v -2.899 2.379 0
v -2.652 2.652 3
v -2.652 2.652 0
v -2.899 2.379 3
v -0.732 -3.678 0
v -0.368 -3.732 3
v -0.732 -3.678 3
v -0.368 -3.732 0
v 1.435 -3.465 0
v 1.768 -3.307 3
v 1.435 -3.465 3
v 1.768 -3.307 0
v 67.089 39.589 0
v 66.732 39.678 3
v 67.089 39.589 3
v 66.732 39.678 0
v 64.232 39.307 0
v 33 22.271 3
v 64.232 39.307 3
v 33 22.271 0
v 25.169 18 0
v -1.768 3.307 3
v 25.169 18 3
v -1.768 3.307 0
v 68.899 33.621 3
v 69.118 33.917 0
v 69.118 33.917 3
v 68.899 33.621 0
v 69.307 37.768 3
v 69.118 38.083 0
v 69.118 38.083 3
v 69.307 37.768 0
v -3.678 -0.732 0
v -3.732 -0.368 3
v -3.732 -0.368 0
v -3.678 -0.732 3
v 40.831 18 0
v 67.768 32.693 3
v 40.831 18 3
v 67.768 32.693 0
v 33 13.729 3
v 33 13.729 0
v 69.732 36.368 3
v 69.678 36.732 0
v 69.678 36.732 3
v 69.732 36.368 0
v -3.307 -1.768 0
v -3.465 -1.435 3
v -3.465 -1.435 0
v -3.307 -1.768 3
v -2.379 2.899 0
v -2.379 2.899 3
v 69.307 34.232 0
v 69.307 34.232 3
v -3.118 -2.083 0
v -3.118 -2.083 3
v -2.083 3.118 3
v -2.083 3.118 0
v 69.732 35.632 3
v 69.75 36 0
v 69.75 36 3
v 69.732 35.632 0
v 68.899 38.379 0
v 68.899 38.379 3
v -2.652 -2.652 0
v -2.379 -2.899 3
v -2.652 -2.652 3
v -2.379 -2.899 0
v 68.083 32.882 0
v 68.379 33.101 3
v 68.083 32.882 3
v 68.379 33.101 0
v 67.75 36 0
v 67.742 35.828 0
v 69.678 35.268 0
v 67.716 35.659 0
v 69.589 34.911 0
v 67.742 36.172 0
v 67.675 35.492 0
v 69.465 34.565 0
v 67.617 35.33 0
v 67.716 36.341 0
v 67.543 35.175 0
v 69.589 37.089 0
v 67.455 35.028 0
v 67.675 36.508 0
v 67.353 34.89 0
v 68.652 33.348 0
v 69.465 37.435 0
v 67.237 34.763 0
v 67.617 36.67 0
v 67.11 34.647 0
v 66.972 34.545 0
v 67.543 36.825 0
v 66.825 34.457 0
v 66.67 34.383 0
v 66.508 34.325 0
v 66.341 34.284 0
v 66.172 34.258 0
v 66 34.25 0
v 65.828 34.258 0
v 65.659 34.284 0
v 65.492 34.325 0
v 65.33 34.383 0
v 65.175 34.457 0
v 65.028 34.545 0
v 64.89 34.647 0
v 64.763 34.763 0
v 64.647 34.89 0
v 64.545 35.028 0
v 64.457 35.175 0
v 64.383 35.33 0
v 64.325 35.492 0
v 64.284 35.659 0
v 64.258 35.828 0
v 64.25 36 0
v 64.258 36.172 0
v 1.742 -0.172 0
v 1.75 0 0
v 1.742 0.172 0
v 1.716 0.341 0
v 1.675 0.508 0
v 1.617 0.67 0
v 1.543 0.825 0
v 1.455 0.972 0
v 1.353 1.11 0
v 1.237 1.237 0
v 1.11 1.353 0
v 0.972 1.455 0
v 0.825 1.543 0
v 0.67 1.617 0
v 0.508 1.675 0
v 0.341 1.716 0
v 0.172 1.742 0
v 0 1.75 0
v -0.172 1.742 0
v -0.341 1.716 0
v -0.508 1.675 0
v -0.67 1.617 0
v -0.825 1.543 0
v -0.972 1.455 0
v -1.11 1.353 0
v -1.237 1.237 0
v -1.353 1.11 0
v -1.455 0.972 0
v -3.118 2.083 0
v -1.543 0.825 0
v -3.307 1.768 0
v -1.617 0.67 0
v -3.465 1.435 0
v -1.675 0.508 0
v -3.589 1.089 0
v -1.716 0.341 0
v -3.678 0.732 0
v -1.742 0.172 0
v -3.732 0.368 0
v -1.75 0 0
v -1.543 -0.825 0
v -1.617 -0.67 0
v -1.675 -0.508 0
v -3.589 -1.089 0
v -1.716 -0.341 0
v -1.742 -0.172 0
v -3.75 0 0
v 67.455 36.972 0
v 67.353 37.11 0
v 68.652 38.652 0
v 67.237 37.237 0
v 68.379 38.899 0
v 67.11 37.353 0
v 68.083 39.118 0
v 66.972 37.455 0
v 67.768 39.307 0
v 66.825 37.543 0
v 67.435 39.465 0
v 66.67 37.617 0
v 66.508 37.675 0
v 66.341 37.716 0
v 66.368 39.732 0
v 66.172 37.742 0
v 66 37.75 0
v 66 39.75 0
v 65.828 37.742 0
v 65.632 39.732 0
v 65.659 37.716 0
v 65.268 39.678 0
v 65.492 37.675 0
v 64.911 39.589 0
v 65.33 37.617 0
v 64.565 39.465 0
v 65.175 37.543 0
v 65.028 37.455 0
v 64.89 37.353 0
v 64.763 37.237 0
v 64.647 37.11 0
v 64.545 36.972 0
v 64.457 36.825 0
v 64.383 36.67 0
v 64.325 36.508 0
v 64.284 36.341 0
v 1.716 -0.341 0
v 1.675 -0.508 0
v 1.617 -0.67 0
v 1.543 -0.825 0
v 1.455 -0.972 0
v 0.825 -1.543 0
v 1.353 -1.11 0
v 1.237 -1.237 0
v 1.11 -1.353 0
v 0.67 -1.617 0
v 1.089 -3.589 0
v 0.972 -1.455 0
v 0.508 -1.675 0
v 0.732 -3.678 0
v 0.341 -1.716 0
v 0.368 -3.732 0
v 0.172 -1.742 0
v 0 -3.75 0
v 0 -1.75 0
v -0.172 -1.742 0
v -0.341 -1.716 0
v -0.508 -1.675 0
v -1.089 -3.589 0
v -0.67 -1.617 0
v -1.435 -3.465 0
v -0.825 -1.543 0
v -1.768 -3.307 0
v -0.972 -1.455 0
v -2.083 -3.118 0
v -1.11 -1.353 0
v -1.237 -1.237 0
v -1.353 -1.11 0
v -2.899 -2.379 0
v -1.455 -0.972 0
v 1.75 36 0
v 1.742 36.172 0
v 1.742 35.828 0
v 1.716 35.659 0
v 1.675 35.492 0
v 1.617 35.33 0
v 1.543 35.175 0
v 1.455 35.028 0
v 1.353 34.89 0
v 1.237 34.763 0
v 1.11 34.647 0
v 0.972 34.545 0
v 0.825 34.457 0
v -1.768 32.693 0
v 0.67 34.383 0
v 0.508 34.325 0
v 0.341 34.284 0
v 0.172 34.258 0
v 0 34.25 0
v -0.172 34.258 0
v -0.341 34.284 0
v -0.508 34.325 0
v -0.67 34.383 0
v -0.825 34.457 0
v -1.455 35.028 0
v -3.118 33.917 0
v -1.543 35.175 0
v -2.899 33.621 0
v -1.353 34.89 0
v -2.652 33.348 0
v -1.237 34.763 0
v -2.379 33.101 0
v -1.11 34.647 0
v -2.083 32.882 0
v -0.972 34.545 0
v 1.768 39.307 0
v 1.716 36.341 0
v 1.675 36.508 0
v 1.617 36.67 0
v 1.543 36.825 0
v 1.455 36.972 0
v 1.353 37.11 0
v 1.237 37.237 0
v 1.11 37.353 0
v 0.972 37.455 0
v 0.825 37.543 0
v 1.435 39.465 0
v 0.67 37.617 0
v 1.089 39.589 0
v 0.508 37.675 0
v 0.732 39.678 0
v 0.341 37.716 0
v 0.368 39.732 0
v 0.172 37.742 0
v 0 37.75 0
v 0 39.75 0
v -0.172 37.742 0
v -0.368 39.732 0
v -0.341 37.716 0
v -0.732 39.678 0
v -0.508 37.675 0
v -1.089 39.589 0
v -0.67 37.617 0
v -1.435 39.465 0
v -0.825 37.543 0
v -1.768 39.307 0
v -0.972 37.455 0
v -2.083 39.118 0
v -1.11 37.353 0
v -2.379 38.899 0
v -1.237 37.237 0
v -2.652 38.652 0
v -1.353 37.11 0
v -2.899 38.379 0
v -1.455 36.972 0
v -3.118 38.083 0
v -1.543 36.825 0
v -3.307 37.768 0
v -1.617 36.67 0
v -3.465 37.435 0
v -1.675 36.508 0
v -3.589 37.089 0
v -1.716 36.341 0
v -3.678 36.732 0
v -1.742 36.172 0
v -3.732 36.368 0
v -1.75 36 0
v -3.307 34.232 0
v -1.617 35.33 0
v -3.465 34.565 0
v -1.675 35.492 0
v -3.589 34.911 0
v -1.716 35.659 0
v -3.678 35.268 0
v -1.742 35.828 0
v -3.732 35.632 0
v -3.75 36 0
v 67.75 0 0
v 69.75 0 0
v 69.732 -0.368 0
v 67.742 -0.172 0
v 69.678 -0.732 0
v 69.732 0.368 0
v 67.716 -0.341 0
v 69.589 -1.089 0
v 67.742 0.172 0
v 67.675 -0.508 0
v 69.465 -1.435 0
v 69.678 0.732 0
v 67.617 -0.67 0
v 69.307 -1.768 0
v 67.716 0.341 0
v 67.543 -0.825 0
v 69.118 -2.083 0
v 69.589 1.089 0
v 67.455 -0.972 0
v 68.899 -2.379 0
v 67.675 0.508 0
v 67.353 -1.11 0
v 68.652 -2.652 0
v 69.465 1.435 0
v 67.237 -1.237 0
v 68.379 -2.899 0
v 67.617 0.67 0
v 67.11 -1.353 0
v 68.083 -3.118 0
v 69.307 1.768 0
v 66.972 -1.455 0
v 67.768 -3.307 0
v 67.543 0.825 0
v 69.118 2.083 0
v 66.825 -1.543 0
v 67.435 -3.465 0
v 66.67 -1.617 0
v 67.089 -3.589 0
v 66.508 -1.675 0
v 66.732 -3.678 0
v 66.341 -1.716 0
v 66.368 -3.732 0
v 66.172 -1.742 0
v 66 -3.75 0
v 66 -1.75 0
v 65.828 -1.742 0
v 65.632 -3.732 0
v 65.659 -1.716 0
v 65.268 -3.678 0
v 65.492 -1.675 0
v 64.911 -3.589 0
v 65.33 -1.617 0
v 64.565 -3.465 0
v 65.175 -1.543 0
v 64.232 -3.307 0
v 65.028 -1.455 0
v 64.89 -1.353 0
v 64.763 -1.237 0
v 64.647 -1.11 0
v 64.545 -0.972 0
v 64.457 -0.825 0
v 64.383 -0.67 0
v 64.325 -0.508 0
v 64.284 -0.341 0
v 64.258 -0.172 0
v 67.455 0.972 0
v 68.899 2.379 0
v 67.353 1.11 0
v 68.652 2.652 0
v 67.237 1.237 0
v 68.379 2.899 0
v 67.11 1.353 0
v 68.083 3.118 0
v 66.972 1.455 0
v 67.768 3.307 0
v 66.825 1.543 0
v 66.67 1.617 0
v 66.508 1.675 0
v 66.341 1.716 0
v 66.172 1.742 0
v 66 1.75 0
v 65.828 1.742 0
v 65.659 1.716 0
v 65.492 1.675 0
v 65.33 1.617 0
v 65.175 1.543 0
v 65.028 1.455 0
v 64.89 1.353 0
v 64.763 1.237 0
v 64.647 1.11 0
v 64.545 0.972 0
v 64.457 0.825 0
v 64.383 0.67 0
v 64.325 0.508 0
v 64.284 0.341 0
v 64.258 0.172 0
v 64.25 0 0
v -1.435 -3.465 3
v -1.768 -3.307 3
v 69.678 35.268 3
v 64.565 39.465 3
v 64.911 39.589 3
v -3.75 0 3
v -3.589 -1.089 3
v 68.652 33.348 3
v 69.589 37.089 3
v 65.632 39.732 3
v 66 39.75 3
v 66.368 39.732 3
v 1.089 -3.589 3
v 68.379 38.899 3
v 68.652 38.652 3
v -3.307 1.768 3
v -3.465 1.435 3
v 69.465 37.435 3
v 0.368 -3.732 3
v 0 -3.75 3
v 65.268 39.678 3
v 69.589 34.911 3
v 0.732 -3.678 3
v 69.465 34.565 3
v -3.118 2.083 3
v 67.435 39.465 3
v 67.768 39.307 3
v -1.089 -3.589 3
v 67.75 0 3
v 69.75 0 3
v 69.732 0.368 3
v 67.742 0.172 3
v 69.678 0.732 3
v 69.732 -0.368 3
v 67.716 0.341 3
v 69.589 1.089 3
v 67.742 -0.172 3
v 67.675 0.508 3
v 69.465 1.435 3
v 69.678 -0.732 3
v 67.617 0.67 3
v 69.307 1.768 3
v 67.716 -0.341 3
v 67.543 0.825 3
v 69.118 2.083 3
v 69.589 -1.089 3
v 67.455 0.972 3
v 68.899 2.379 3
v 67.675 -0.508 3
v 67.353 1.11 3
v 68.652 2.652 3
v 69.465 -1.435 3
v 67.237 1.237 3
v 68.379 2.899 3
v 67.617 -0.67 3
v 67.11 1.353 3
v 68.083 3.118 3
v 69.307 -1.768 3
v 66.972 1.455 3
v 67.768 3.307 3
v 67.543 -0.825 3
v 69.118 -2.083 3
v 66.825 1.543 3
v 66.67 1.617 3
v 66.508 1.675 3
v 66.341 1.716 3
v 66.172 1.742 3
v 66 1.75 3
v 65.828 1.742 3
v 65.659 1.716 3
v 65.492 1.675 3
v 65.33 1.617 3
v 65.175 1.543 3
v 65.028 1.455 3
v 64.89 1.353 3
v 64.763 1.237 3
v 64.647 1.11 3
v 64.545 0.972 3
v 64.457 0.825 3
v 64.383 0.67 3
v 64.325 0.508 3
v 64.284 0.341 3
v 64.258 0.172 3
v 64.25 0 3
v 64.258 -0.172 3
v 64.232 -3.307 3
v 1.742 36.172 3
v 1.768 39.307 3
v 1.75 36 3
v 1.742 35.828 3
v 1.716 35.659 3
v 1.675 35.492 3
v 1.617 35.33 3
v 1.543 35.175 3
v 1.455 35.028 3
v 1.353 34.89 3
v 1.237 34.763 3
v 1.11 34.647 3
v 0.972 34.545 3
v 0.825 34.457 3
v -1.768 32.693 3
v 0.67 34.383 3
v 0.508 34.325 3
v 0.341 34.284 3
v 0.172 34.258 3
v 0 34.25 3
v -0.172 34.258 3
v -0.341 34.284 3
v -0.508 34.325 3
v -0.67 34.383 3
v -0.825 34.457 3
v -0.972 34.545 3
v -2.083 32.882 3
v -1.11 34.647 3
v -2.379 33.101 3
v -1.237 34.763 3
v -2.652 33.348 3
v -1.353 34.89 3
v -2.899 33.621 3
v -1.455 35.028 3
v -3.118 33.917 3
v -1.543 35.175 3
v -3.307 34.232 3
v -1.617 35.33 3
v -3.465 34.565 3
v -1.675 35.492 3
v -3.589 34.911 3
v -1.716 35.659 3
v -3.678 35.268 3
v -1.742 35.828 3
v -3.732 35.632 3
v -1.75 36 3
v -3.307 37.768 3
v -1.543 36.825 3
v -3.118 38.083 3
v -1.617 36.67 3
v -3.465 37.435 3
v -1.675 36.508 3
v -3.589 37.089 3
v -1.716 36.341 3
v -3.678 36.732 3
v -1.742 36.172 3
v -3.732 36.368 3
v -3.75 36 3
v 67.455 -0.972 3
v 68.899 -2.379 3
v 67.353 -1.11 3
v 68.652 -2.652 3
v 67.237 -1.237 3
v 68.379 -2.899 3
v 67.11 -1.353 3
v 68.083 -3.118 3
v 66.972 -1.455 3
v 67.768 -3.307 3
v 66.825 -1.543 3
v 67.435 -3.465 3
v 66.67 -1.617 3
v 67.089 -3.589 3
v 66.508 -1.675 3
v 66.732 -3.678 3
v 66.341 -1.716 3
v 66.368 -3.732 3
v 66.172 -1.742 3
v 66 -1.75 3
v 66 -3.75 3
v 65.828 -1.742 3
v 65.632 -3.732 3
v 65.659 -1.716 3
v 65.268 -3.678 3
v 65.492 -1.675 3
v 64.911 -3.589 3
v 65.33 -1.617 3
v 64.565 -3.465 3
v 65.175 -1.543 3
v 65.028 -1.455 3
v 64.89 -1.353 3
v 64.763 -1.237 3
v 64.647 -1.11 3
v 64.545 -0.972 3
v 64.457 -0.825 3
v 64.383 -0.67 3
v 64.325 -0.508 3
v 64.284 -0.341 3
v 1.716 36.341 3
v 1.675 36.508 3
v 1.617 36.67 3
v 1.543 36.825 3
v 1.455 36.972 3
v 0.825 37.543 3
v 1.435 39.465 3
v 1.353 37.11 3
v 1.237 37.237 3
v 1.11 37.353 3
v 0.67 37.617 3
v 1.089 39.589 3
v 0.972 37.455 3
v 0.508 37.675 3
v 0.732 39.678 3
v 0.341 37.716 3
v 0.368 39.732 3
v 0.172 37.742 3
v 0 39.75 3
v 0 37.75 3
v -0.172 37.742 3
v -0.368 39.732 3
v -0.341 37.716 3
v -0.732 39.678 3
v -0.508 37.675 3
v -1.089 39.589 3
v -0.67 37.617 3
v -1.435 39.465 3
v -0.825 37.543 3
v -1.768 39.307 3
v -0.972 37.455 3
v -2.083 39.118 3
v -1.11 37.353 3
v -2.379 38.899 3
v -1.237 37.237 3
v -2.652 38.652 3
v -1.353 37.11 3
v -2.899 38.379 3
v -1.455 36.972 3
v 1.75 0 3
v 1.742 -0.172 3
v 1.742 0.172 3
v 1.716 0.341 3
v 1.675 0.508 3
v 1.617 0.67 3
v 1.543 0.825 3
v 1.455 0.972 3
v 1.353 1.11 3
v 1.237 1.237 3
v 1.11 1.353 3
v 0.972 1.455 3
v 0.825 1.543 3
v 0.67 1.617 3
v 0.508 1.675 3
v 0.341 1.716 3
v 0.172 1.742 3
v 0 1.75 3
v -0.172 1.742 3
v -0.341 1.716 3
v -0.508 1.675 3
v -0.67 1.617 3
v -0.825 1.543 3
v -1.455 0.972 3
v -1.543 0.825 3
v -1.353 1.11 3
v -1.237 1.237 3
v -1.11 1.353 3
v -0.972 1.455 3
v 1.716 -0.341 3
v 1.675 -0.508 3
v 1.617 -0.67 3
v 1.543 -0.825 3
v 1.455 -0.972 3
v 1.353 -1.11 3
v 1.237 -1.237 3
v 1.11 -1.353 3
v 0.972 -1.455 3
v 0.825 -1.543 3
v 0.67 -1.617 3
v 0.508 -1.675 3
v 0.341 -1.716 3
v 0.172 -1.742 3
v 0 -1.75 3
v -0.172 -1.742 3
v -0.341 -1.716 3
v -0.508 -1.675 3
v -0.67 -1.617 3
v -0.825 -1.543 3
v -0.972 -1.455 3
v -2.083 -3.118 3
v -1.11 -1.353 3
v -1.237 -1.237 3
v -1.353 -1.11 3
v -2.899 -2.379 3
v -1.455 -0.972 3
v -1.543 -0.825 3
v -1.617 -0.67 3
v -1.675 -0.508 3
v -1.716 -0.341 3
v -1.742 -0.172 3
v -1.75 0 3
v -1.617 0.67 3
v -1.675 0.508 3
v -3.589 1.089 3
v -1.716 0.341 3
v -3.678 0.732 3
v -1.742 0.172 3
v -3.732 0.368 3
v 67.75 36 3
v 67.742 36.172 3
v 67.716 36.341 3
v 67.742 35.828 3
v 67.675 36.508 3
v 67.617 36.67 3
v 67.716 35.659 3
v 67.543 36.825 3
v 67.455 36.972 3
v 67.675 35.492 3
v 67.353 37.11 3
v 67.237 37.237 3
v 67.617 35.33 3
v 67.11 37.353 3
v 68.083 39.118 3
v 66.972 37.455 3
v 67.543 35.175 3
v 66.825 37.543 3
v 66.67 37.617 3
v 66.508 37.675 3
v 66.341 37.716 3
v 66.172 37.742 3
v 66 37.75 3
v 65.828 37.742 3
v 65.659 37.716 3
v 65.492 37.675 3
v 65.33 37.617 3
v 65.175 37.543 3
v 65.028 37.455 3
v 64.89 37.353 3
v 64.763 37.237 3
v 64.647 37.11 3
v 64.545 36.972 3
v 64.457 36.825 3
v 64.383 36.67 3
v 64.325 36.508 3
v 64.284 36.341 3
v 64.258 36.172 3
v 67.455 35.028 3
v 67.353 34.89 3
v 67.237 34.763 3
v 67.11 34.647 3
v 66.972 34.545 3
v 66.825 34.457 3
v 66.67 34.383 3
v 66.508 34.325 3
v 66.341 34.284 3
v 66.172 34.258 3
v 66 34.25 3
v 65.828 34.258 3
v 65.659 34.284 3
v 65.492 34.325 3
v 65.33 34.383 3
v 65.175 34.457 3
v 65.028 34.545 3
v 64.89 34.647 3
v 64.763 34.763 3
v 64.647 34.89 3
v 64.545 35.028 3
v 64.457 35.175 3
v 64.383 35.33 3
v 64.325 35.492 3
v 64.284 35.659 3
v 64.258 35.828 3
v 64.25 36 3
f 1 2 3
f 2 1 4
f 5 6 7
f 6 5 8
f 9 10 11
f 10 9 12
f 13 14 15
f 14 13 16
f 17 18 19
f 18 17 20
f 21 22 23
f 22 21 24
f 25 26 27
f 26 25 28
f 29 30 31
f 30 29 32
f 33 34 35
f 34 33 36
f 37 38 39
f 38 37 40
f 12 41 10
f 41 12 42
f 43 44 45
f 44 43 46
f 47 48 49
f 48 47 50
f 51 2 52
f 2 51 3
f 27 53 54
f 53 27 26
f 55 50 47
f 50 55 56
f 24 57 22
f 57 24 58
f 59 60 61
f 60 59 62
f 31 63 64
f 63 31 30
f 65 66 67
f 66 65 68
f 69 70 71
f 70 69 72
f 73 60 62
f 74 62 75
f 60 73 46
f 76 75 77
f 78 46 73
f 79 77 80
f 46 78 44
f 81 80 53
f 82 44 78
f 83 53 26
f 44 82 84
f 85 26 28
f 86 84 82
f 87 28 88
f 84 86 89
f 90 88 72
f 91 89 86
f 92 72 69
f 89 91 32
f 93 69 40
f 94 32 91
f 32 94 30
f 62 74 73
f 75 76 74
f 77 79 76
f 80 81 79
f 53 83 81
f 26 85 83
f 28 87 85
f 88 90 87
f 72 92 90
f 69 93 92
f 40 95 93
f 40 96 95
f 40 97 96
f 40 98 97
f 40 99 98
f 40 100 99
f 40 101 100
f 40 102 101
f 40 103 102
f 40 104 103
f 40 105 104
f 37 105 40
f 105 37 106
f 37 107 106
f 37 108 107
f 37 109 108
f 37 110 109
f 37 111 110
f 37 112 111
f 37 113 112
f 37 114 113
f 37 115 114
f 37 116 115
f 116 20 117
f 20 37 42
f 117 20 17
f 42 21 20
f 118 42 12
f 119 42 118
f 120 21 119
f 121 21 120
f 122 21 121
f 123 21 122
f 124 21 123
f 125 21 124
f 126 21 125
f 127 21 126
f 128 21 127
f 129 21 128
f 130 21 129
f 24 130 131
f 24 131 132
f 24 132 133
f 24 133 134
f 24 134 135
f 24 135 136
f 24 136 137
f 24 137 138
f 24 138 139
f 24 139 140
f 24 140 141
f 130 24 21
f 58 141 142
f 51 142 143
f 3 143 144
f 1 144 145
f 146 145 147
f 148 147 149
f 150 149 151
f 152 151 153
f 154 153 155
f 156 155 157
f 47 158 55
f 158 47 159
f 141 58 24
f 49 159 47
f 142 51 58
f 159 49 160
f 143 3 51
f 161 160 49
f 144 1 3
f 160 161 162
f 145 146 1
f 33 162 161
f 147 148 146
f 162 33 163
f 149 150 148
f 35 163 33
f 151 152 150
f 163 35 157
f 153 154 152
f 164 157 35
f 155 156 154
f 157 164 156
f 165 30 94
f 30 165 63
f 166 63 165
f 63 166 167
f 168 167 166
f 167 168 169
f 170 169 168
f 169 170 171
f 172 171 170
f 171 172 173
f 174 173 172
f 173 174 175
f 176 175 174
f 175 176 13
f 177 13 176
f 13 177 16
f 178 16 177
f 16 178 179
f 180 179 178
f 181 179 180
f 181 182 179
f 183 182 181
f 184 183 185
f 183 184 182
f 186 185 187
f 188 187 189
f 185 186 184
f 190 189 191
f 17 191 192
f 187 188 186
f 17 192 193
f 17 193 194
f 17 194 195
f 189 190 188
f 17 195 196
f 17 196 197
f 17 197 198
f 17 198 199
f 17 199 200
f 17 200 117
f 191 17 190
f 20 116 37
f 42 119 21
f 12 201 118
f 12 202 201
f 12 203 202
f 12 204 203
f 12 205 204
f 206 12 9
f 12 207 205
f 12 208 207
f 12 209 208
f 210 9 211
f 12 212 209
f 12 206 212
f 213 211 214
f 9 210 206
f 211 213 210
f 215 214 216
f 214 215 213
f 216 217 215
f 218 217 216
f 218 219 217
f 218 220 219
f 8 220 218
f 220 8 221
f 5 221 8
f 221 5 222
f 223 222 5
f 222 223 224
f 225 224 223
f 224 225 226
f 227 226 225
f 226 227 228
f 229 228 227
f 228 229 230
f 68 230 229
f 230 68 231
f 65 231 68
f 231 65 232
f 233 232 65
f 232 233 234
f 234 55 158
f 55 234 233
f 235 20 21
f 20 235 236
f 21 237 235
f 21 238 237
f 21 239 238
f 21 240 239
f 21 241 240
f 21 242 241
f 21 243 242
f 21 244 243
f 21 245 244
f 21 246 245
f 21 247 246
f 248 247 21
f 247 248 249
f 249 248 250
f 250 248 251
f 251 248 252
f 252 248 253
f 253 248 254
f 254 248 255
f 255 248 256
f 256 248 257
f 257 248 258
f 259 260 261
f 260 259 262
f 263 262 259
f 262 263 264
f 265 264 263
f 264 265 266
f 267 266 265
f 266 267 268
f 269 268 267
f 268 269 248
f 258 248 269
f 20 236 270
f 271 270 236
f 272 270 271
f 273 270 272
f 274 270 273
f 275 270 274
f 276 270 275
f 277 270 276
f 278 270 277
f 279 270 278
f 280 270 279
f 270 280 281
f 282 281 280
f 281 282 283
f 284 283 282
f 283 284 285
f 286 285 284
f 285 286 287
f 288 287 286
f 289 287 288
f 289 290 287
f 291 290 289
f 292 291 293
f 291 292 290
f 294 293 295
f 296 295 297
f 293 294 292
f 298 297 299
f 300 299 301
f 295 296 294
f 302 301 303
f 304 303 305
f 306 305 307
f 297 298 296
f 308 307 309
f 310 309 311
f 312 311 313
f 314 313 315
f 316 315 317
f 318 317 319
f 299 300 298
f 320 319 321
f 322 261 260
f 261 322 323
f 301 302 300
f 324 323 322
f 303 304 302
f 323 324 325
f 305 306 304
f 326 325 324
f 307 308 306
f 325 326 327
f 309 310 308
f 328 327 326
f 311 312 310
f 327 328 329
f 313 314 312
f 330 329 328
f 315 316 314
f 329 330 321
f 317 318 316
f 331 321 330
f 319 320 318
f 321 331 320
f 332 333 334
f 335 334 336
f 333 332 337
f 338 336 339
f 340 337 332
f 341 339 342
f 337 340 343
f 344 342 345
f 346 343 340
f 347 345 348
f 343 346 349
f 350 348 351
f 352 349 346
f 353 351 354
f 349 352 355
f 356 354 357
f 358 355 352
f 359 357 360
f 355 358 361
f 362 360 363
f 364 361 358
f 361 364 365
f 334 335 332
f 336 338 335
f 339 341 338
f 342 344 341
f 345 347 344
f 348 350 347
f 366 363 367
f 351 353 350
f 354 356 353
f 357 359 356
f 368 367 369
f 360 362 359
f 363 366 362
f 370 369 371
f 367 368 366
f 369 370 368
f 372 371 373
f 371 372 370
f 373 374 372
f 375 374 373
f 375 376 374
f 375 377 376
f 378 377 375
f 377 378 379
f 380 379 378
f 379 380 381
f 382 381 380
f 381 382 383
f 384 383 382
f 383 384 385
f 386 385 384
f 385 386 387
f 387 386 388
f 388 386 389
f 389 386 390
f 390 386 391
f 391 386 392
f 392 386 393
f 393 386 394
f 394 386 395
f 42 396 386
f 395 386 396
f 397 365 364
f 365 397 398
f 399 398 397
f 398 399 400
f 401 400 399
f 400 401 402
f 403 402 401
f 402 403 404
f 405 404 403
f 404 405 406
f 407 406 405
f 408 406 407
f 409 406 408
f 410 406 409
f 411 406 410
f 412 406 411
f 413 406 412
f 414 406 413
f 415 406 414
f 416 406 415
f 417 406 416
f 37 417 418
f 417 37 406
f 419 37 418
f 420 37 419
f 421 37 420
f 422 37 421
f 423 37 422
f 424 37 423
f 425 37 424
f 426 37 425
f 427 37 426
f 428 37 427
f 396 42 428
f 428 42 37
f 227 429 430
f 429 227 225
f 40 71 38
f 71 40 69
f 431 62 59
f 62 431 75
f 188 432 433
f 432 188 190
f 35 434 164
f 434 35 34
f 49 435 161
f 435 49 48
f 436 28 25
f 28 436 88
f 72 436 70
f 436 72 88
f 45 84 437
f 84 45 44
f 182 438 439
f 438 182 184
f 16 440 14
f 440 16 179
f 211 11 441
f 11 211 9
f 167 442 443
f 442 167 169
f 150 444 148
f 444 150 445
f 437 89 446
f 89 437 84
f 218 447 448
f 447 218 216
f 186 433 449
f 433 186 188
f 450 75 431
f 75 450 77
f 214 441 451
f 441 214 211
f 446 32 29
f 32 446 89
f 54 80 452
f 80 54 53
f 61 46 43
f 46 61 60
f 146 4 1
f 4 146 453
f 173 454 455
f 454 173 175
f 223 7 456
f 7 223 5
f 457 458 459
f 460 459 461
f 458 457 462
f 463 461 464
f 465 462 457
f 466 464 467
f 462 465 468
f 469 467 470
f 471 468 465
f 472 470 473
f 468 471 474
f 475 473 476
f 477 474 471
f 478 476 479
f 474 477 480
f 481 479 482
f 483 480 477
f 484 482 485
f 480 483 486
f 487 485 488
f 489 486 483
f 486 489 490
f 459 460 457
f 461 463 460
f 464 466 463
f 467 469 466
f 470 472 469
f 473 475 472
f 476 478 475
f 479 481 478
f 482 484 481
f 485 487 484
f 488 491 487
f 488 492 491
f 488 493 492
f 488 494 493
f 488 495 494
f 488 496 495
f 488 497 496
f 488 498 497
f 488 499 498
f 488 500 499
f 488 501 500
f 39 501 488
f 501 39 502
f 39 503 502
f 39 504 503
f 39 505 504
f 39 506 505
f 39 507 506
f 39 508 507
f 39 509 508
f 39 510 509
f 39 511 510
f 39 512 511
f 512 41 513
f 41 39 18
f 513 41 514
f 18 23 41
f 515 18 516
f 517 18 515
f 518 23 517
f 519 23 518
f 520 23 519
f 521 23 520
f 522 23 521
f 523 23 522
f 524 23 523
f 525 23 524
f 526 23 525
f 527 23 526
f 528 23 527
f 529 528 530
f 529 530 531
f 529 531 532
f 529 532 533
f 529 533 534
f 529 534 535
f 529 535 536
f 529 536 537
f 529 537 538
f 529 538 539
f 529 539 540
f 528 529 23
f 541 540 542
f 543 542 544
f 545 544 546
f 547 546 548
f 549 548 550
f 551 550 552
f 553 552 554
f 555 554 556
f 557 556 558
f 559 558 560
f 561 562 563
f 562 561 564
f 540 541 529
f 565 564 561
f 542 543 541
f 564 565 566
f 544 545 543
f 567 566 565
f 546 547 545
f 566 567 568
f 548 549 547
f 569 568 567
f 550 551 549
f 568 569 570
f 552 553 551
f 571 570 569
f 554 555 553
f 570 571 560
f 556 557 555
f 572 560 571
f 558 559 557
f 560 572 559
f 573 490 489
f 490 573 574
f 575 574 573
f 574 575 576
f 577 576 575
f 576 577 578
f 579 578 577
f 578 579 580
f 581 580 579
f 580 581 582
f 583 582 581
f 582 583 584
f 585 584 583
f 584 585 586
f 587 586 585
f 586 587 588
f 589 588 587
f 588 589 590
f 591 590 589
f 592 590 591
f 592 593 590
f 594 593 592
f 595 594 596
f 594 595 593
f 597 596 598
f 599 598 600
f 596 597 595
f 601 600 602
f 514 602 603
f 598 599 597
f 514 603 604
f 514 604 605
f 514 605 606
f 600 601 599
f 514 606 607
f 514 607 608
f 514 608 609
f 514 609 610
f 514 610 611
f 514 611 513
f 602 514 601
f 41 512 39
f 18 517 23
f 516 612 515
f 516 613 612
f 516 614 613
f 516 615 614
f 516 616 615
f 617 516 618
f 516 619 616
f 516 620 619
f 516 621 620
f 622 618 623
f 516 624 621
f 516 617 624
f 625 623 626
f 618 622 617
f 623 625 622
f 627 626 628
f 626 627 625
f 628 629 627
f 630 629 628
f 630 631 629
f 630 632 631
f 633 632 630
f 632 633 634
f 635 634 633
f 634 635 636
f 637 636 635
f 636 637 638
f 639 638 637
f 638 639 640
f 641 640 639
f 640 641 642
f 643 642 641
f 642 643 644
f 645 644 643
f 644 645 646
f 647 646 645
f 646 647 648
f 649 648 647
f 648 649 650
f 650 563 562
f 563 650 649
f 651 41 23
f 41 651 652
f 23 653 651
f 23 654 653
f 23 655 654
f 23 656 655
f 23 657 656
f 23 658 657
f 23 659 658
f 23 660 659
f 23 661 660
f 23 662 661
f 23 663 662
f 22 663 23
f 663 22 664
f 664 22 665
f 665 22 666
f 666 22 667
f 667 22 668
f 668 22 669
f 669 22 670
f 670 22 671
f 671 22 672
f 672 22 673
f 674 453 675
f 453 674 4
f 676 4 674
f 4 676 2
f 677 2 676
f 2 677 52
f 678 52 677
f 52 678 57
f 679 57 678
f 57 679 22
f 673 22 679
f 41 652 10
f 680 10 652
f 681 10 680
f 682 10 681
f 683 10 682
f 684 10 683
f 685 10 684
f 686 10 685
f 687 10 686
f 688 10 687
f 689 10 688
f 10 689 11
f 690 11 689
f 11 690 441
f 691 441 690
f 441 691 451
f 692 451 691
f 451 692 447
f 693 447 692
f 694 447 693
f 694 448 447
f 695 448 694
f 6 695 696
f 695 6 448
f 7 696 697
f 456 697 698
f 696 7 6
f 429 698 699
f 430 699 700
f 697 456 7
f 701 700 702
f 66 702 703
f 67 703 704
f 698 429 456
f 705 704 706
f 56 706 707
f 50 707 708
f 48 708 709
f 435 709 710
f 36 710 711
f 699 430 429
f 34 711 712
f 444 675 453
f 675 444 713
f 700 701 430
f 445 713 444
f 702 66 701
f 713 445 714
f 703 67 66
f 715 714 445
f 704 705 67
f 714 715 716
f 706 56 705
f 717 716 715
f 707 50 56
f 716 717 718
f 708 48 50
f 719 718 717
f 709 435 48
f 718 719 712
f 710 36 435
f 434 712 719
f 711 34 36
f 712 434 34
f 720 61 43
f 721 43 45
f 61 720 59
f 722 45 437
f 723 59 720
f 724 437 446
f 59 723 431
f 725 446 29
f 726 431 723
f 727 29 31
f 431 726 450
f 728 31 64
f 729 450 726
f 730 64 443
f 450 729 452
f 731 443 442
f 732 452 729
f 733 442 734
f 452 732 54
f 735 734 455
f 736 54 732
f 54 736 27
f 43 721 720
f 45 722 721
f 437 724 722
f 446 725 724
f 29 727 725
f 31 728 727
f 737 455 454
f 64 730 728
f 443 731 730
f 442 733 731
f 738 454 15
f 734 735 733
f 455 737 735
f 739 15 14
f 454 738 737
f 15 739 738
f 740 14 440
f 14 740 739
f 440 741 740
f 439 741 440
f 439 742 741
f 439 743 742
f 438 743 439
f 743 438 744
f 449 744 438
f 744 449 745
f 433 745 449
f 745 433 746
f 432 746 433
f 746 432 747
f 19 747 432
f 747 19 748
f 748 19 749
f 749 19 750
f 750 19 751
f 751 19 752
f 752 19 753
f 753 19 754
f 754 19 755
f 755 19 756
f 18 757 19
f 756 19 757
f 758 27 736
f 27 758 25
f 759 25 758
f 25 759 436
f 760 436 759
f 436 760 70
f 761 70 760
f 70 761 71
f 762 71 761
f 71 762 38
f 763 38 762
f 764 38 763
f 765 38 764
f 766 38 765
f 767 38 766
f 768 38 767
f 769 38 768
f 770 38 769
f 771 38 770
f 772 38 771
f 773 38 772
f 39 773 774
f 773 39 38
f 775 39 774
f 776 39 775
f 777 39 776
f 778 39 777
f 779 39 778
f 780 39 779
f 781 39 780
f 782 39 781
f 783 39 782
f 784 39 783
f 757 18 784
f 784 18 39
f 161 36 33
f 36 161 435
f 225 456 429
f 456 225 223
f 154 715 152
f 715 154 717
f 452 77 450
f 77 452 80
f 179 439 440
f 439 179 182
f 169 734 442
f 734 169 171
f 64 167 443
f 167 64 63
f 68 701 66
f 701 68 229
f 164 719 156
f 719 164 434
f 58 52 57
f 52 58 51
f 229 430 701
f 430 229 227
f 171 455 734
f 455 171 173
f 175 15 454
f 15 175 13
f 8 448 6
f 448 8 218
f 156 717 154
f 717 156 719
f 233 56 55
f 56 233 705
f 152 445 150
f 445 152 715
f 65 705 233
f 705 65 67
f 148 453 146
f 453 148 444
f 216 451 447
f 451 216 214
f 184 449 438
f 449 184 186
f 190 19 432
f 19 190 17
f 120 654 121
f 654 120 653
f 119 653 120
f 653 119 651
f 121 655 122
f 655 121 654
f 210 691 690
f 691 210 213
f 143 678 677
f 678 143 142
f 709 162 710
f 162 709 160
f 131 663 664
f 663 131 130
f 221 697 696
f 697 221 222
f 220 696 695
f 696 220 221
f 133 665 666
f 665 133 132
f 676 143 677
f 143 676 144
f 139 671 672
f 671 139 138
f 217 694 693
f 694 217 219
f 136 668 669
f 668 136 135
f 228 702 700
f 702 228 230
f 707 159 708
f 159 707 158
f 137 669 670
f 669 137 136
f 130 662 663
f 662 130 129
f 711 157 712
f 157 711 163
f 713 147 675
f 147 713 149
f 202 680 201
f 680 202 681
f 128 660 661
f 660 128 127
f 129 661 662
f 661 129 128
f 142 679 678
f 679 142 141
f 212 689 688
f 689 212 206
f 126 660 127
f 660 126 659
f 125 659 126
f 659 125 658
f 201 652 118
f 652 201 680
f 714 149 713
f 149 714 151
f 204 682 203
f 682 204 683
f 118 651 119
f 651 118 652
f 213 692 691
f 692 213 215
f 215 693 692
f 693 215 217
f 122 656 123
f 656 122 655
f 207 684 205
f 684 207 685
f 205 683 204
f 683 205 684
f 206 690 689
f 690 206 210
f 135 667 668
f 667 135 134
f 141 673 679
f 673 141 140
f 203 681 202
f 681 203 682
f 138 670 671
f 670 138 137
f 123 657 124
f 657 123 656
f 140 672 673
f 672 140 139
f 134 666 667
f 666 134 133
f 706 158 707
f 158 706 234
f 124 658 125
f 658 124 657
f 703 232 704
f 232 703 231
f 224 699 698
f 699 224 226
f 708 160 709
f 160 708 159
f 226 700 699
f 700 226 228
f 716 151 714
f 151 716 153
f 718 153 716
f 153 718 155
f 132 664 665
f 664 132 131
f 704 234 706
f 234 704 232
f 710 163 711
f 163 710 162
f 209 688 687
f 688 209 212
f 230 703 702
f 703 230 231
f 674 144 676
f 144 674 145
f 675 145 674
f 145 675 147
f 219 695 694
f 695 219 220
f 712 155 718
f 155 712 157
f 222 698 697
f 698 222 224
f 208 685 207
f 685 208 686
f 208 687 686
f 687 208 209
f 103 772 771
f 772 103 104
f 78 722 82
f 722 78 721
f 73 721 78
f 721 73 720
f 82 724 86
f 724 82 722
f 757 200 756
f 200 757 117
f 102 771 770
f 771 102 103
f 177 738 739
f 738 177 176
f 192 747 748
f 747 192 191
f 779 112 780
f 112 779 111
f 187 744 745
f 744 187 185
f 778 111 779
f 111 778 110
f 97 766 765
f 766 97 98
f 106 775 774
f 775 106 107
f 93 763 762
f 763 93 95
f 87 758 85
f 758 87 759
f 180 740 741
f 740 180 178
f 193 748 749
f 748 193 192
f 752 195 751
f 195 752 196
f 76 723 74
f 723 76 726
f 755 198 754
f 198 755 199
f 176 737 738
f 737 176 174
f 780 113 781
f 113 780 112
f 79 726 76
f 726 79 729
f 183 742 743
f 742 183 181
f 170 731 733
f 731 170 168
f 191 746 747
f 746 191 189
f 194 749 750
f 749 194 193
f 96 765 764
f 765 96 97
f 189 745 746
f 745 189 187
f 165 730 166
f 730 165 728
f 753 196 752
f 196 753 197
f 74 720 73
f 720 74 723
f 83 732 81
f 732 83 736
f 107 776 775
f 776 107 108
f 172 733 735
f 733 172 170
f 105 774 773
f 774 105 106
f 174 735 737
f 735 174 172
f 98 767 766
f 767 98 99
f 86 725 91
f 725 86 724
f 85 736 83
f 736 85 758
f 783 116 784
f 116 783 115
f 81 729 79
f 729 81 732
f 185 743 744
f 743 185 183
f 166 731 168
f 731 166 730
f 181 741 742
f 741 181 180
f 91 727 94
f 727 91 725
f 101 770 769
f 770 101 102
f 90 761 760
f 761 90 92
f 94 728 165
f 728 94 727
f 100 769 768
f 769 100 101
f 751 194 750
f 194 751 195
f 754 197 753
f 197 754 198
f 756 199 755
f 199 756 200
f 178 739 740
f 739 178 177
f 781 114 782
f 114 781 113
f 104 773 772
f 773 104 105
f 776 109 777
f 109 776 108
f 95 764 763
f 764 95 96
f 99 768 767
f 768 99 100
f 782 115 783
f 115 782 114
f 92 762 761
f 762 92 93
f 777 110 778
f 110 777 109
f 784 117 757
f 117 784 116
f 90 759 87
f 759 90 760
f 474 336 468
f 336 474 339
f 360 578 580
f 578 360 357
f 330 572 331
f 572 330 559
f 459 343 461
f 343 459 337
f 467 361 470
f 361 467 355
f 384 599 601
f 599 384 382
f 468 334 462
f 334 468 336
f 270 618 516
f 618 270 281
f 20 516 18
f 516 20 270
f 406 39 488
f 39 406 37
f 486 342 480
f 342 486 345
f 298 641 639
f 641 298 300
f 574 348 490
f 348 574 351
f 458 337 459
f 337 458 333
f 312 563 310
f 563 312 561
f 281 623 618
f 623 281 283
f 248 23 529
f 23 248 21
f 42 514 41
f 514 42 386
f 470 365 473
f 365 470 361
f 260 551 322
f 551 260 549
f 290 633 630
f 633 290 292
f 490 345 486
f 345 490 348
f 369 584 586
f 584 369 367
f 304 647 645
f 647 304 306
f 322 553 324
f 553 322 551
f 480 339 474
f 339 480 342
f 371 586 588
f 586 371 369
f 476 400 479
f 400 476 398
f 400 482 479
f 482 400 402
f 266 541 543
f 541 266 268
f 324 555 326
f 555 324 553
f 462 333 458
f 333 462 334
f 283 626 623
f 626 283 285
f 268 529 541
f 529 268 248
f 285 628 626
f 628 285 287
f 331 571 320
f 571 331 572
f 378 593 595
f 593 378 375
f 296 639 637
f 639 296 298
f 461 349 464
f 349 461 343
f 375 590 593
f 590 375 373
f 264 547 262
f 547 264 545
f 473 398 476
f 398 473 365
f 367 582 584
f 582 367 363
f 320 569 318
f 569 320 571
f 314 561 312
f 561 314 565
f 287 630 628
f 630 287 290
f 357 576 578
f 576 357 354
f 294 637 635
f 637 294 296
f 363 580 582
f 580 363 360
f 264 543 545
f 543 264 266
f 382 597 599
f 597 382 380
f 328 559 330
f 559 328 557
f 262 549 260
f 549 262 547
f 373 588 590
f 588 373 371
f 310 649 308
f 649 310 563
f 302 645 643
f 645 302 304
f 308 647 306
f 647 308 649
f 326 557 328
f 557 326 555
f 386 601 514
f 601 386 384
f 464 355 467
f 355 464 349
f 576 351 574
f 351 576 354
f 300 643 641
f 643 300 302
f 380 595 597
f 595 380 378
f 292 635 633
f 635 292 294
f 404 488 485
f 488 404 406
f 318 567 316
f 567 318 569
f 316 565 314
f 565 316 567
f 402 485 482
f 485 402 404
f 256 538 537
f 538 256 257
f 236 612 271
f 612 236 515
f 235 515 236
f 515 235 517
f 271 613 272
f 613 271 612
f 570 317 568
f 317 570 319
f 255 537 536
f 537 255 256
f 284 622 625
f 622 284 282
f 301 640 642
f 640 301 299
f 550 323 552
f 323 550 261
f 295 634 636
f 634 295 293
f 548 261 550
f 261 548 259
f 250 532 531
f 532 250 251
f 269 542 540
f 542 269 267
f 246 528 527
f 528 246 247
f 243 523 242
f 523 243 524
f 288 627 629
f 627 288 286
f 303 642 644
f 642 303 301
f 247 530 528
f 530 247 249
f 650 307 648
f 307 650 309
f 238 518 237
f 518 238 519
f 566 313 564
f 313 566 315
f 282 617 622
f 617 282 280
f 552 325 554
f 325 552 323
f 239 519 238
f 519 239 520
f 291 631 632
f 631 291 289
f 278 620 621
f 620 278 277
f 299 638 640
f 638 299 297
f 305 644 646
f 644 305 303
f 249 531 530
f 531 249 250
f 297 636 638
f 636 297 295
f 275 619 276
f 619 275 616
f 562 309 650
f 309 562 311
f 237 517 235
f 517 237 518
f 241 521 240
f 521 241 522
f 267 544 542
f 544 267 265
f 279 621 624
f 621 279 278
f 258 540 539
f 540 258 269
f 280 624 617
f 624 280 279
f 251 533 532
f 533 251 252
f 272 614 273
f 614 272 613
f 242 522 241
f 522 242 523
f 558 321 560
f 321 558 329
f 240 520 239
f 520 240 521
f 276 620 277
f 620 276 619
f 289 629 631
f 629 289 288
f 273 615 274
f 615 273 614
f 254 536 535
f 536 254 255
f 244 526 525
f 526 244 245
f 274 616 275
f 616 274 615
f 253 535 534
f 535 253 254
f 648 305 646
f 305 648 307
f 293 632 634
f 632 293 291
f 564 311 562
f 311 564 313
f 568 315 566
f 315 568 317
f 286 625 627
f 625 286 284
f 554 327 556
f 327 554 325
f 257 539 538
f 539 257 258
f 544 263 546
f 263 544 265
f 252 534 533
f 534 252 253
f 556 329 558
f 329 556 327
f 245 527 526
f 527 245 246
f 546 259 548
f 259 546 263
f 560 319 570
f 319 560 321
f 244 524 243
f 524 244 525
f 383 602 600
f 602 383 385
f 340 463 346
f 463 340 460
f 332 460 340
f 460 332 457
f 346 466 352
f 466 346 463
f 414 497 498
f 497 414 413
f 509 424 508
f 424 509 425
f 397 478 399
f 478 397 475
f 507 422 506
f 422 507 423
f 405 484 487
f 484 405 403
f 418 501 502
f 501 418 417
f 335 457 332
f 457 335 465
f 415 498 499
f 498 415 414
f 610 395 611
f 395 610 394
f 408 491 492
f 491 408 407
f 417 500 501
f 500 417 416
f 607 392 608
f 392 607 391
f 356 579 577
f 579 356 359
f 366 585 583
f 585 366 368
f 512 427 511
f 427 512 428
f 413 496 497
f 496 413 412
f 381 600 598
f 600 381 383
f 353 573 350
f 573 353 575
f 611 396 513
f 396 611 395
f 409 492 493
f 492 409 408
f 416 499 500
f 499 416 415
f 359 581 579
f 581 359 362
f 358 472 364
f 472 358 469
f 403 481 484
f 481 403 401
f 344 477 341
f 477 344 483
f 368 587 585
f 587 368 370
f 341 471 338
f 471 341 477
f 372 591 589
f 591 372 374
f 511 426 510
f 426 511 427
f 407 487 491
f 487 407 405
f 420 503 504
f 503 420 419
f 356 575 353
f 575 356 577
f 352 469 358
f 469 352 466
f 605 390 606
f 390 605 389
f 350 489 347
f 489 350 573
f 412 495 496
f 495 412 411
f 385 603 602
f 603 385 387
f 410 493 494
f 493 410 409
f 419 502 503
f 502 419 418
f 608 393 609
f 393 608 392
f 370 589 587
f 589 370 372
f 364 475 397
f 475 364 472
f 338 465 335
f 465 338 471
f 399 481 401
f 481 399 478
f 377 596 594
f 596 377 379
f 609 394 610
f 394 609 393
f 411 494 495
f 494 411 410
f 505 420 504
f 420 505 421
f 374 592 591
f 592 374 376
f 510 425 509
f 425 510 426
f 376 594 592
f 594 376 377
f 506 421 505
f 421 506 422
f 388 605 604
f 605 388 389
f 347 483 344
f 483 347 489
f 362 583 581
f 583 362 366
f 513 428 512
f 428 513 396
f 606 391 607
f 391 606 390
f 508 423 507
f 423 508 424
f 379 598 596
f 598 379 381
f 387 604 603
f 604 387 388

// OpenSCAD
// file: subpieces/bone.scad
        

module bone(length, width, thickness, _fn) {
    hull() {
        cylinder(h = thickness, r = width, center = false, $fn = _fn);
        translate([0, length, 0])
            cylinder(h = thickness, r = width, center = false, $fn = _fn);
    }
}


// demo bone
bone(
    length = 40,
    width = 6,
    thickness = 3,
    _fn = 128
);
// file: body-piece-a.scad
use <./subpieces/bone.scad>


/**
 * bodyPieceA
 * @name bodyPieceA
 * @description Joins sections of body
 * @type piece
 * @parent bodyComponent
 */
module bodyPieceA(
    with_platform = true
) {

    fixations_position_lenth = 66;
    fixations_position_width = 36;

    branches_width = 7.5;

    platform_lenth = 40;
    platform_width = 30;
    platform_z_offset = 0;

    _fn = 64;
    thickness = 3;

    // Fixations holes configuration
    screw_hole_diameter = 3.5;

    union() {
        difference() {        
            hull() {
                translate([0, 0, 0])
                    cylinder(h = thickness, r = branches_width / 2, center = false, $fn = _fn);
                translate([fixations_position_lenth, fixations_position_width, 0])
                    cylinder(h = thickness, r = branches_width / 2, center = false, $fn = _fn);
            }

            // bone(length, width, thickness, _fn);

            translate([0, 0, 0])
                cylinder(h = thickness * 5, r = screw_hole_diameter / 2, center = true, $fn = _fn);

            translate([fixations_position_lenth, fixations_position_width, 0])
                cylinder(h = thickness * 5, r = screw_hole_diameter / 2, center = true, $fn = _fn);
        }

        difference() {        
            hull() {
                translate([0, fixations_position_width, 0])
                    cylinder(h = thickness, r = branches_width / 2, center = false, $fn = _fn);
                translate([fixations_position_lenth, 0, 0])
                    cylinder(h = thickness, r = branches_width / 2, center = false, $fn = _fn);
            }
            translate([0, fixations_position_width, 0])
                cylinder(h = thickness * 5, r = screw_hole_diameter / 2, center = true, $fn = _fn);

            translate([fixations_position_lenth, 0, 0])
                cylinder(h = thickness * 5, r = screw_hole_diameter / 2, center = true, $fn = _fn);
        }

        // Platfor for components
        if (with_platform)
            translate([
                fixations_position_lenth / 2,
                fixations_position_width / 2,
                thickness / 2 + platform_z_offset
                ])
                cube([platform_lenth, platform_width, thickness], center = true);

    }

}


/**
 * @stl
 * @png
 * @colorscheme BeforeDawn
 * @view axes,scales
 */
bodyPieceA();
// main file
use <./body-piece-a.scad>

/**
 * bodyPieceA1
 * @name bodyPieceA1
 * @description Joins sections of body
 * @type piece
 * @parent bodyComponent
 */
module bodyPieceA1() {
    bodyPieceA(false);
}

/**
 * @stl
 * @png
 * @colorscheme BeforeDawn
 * @view axes,scales
 */
bodyPieceA1();
